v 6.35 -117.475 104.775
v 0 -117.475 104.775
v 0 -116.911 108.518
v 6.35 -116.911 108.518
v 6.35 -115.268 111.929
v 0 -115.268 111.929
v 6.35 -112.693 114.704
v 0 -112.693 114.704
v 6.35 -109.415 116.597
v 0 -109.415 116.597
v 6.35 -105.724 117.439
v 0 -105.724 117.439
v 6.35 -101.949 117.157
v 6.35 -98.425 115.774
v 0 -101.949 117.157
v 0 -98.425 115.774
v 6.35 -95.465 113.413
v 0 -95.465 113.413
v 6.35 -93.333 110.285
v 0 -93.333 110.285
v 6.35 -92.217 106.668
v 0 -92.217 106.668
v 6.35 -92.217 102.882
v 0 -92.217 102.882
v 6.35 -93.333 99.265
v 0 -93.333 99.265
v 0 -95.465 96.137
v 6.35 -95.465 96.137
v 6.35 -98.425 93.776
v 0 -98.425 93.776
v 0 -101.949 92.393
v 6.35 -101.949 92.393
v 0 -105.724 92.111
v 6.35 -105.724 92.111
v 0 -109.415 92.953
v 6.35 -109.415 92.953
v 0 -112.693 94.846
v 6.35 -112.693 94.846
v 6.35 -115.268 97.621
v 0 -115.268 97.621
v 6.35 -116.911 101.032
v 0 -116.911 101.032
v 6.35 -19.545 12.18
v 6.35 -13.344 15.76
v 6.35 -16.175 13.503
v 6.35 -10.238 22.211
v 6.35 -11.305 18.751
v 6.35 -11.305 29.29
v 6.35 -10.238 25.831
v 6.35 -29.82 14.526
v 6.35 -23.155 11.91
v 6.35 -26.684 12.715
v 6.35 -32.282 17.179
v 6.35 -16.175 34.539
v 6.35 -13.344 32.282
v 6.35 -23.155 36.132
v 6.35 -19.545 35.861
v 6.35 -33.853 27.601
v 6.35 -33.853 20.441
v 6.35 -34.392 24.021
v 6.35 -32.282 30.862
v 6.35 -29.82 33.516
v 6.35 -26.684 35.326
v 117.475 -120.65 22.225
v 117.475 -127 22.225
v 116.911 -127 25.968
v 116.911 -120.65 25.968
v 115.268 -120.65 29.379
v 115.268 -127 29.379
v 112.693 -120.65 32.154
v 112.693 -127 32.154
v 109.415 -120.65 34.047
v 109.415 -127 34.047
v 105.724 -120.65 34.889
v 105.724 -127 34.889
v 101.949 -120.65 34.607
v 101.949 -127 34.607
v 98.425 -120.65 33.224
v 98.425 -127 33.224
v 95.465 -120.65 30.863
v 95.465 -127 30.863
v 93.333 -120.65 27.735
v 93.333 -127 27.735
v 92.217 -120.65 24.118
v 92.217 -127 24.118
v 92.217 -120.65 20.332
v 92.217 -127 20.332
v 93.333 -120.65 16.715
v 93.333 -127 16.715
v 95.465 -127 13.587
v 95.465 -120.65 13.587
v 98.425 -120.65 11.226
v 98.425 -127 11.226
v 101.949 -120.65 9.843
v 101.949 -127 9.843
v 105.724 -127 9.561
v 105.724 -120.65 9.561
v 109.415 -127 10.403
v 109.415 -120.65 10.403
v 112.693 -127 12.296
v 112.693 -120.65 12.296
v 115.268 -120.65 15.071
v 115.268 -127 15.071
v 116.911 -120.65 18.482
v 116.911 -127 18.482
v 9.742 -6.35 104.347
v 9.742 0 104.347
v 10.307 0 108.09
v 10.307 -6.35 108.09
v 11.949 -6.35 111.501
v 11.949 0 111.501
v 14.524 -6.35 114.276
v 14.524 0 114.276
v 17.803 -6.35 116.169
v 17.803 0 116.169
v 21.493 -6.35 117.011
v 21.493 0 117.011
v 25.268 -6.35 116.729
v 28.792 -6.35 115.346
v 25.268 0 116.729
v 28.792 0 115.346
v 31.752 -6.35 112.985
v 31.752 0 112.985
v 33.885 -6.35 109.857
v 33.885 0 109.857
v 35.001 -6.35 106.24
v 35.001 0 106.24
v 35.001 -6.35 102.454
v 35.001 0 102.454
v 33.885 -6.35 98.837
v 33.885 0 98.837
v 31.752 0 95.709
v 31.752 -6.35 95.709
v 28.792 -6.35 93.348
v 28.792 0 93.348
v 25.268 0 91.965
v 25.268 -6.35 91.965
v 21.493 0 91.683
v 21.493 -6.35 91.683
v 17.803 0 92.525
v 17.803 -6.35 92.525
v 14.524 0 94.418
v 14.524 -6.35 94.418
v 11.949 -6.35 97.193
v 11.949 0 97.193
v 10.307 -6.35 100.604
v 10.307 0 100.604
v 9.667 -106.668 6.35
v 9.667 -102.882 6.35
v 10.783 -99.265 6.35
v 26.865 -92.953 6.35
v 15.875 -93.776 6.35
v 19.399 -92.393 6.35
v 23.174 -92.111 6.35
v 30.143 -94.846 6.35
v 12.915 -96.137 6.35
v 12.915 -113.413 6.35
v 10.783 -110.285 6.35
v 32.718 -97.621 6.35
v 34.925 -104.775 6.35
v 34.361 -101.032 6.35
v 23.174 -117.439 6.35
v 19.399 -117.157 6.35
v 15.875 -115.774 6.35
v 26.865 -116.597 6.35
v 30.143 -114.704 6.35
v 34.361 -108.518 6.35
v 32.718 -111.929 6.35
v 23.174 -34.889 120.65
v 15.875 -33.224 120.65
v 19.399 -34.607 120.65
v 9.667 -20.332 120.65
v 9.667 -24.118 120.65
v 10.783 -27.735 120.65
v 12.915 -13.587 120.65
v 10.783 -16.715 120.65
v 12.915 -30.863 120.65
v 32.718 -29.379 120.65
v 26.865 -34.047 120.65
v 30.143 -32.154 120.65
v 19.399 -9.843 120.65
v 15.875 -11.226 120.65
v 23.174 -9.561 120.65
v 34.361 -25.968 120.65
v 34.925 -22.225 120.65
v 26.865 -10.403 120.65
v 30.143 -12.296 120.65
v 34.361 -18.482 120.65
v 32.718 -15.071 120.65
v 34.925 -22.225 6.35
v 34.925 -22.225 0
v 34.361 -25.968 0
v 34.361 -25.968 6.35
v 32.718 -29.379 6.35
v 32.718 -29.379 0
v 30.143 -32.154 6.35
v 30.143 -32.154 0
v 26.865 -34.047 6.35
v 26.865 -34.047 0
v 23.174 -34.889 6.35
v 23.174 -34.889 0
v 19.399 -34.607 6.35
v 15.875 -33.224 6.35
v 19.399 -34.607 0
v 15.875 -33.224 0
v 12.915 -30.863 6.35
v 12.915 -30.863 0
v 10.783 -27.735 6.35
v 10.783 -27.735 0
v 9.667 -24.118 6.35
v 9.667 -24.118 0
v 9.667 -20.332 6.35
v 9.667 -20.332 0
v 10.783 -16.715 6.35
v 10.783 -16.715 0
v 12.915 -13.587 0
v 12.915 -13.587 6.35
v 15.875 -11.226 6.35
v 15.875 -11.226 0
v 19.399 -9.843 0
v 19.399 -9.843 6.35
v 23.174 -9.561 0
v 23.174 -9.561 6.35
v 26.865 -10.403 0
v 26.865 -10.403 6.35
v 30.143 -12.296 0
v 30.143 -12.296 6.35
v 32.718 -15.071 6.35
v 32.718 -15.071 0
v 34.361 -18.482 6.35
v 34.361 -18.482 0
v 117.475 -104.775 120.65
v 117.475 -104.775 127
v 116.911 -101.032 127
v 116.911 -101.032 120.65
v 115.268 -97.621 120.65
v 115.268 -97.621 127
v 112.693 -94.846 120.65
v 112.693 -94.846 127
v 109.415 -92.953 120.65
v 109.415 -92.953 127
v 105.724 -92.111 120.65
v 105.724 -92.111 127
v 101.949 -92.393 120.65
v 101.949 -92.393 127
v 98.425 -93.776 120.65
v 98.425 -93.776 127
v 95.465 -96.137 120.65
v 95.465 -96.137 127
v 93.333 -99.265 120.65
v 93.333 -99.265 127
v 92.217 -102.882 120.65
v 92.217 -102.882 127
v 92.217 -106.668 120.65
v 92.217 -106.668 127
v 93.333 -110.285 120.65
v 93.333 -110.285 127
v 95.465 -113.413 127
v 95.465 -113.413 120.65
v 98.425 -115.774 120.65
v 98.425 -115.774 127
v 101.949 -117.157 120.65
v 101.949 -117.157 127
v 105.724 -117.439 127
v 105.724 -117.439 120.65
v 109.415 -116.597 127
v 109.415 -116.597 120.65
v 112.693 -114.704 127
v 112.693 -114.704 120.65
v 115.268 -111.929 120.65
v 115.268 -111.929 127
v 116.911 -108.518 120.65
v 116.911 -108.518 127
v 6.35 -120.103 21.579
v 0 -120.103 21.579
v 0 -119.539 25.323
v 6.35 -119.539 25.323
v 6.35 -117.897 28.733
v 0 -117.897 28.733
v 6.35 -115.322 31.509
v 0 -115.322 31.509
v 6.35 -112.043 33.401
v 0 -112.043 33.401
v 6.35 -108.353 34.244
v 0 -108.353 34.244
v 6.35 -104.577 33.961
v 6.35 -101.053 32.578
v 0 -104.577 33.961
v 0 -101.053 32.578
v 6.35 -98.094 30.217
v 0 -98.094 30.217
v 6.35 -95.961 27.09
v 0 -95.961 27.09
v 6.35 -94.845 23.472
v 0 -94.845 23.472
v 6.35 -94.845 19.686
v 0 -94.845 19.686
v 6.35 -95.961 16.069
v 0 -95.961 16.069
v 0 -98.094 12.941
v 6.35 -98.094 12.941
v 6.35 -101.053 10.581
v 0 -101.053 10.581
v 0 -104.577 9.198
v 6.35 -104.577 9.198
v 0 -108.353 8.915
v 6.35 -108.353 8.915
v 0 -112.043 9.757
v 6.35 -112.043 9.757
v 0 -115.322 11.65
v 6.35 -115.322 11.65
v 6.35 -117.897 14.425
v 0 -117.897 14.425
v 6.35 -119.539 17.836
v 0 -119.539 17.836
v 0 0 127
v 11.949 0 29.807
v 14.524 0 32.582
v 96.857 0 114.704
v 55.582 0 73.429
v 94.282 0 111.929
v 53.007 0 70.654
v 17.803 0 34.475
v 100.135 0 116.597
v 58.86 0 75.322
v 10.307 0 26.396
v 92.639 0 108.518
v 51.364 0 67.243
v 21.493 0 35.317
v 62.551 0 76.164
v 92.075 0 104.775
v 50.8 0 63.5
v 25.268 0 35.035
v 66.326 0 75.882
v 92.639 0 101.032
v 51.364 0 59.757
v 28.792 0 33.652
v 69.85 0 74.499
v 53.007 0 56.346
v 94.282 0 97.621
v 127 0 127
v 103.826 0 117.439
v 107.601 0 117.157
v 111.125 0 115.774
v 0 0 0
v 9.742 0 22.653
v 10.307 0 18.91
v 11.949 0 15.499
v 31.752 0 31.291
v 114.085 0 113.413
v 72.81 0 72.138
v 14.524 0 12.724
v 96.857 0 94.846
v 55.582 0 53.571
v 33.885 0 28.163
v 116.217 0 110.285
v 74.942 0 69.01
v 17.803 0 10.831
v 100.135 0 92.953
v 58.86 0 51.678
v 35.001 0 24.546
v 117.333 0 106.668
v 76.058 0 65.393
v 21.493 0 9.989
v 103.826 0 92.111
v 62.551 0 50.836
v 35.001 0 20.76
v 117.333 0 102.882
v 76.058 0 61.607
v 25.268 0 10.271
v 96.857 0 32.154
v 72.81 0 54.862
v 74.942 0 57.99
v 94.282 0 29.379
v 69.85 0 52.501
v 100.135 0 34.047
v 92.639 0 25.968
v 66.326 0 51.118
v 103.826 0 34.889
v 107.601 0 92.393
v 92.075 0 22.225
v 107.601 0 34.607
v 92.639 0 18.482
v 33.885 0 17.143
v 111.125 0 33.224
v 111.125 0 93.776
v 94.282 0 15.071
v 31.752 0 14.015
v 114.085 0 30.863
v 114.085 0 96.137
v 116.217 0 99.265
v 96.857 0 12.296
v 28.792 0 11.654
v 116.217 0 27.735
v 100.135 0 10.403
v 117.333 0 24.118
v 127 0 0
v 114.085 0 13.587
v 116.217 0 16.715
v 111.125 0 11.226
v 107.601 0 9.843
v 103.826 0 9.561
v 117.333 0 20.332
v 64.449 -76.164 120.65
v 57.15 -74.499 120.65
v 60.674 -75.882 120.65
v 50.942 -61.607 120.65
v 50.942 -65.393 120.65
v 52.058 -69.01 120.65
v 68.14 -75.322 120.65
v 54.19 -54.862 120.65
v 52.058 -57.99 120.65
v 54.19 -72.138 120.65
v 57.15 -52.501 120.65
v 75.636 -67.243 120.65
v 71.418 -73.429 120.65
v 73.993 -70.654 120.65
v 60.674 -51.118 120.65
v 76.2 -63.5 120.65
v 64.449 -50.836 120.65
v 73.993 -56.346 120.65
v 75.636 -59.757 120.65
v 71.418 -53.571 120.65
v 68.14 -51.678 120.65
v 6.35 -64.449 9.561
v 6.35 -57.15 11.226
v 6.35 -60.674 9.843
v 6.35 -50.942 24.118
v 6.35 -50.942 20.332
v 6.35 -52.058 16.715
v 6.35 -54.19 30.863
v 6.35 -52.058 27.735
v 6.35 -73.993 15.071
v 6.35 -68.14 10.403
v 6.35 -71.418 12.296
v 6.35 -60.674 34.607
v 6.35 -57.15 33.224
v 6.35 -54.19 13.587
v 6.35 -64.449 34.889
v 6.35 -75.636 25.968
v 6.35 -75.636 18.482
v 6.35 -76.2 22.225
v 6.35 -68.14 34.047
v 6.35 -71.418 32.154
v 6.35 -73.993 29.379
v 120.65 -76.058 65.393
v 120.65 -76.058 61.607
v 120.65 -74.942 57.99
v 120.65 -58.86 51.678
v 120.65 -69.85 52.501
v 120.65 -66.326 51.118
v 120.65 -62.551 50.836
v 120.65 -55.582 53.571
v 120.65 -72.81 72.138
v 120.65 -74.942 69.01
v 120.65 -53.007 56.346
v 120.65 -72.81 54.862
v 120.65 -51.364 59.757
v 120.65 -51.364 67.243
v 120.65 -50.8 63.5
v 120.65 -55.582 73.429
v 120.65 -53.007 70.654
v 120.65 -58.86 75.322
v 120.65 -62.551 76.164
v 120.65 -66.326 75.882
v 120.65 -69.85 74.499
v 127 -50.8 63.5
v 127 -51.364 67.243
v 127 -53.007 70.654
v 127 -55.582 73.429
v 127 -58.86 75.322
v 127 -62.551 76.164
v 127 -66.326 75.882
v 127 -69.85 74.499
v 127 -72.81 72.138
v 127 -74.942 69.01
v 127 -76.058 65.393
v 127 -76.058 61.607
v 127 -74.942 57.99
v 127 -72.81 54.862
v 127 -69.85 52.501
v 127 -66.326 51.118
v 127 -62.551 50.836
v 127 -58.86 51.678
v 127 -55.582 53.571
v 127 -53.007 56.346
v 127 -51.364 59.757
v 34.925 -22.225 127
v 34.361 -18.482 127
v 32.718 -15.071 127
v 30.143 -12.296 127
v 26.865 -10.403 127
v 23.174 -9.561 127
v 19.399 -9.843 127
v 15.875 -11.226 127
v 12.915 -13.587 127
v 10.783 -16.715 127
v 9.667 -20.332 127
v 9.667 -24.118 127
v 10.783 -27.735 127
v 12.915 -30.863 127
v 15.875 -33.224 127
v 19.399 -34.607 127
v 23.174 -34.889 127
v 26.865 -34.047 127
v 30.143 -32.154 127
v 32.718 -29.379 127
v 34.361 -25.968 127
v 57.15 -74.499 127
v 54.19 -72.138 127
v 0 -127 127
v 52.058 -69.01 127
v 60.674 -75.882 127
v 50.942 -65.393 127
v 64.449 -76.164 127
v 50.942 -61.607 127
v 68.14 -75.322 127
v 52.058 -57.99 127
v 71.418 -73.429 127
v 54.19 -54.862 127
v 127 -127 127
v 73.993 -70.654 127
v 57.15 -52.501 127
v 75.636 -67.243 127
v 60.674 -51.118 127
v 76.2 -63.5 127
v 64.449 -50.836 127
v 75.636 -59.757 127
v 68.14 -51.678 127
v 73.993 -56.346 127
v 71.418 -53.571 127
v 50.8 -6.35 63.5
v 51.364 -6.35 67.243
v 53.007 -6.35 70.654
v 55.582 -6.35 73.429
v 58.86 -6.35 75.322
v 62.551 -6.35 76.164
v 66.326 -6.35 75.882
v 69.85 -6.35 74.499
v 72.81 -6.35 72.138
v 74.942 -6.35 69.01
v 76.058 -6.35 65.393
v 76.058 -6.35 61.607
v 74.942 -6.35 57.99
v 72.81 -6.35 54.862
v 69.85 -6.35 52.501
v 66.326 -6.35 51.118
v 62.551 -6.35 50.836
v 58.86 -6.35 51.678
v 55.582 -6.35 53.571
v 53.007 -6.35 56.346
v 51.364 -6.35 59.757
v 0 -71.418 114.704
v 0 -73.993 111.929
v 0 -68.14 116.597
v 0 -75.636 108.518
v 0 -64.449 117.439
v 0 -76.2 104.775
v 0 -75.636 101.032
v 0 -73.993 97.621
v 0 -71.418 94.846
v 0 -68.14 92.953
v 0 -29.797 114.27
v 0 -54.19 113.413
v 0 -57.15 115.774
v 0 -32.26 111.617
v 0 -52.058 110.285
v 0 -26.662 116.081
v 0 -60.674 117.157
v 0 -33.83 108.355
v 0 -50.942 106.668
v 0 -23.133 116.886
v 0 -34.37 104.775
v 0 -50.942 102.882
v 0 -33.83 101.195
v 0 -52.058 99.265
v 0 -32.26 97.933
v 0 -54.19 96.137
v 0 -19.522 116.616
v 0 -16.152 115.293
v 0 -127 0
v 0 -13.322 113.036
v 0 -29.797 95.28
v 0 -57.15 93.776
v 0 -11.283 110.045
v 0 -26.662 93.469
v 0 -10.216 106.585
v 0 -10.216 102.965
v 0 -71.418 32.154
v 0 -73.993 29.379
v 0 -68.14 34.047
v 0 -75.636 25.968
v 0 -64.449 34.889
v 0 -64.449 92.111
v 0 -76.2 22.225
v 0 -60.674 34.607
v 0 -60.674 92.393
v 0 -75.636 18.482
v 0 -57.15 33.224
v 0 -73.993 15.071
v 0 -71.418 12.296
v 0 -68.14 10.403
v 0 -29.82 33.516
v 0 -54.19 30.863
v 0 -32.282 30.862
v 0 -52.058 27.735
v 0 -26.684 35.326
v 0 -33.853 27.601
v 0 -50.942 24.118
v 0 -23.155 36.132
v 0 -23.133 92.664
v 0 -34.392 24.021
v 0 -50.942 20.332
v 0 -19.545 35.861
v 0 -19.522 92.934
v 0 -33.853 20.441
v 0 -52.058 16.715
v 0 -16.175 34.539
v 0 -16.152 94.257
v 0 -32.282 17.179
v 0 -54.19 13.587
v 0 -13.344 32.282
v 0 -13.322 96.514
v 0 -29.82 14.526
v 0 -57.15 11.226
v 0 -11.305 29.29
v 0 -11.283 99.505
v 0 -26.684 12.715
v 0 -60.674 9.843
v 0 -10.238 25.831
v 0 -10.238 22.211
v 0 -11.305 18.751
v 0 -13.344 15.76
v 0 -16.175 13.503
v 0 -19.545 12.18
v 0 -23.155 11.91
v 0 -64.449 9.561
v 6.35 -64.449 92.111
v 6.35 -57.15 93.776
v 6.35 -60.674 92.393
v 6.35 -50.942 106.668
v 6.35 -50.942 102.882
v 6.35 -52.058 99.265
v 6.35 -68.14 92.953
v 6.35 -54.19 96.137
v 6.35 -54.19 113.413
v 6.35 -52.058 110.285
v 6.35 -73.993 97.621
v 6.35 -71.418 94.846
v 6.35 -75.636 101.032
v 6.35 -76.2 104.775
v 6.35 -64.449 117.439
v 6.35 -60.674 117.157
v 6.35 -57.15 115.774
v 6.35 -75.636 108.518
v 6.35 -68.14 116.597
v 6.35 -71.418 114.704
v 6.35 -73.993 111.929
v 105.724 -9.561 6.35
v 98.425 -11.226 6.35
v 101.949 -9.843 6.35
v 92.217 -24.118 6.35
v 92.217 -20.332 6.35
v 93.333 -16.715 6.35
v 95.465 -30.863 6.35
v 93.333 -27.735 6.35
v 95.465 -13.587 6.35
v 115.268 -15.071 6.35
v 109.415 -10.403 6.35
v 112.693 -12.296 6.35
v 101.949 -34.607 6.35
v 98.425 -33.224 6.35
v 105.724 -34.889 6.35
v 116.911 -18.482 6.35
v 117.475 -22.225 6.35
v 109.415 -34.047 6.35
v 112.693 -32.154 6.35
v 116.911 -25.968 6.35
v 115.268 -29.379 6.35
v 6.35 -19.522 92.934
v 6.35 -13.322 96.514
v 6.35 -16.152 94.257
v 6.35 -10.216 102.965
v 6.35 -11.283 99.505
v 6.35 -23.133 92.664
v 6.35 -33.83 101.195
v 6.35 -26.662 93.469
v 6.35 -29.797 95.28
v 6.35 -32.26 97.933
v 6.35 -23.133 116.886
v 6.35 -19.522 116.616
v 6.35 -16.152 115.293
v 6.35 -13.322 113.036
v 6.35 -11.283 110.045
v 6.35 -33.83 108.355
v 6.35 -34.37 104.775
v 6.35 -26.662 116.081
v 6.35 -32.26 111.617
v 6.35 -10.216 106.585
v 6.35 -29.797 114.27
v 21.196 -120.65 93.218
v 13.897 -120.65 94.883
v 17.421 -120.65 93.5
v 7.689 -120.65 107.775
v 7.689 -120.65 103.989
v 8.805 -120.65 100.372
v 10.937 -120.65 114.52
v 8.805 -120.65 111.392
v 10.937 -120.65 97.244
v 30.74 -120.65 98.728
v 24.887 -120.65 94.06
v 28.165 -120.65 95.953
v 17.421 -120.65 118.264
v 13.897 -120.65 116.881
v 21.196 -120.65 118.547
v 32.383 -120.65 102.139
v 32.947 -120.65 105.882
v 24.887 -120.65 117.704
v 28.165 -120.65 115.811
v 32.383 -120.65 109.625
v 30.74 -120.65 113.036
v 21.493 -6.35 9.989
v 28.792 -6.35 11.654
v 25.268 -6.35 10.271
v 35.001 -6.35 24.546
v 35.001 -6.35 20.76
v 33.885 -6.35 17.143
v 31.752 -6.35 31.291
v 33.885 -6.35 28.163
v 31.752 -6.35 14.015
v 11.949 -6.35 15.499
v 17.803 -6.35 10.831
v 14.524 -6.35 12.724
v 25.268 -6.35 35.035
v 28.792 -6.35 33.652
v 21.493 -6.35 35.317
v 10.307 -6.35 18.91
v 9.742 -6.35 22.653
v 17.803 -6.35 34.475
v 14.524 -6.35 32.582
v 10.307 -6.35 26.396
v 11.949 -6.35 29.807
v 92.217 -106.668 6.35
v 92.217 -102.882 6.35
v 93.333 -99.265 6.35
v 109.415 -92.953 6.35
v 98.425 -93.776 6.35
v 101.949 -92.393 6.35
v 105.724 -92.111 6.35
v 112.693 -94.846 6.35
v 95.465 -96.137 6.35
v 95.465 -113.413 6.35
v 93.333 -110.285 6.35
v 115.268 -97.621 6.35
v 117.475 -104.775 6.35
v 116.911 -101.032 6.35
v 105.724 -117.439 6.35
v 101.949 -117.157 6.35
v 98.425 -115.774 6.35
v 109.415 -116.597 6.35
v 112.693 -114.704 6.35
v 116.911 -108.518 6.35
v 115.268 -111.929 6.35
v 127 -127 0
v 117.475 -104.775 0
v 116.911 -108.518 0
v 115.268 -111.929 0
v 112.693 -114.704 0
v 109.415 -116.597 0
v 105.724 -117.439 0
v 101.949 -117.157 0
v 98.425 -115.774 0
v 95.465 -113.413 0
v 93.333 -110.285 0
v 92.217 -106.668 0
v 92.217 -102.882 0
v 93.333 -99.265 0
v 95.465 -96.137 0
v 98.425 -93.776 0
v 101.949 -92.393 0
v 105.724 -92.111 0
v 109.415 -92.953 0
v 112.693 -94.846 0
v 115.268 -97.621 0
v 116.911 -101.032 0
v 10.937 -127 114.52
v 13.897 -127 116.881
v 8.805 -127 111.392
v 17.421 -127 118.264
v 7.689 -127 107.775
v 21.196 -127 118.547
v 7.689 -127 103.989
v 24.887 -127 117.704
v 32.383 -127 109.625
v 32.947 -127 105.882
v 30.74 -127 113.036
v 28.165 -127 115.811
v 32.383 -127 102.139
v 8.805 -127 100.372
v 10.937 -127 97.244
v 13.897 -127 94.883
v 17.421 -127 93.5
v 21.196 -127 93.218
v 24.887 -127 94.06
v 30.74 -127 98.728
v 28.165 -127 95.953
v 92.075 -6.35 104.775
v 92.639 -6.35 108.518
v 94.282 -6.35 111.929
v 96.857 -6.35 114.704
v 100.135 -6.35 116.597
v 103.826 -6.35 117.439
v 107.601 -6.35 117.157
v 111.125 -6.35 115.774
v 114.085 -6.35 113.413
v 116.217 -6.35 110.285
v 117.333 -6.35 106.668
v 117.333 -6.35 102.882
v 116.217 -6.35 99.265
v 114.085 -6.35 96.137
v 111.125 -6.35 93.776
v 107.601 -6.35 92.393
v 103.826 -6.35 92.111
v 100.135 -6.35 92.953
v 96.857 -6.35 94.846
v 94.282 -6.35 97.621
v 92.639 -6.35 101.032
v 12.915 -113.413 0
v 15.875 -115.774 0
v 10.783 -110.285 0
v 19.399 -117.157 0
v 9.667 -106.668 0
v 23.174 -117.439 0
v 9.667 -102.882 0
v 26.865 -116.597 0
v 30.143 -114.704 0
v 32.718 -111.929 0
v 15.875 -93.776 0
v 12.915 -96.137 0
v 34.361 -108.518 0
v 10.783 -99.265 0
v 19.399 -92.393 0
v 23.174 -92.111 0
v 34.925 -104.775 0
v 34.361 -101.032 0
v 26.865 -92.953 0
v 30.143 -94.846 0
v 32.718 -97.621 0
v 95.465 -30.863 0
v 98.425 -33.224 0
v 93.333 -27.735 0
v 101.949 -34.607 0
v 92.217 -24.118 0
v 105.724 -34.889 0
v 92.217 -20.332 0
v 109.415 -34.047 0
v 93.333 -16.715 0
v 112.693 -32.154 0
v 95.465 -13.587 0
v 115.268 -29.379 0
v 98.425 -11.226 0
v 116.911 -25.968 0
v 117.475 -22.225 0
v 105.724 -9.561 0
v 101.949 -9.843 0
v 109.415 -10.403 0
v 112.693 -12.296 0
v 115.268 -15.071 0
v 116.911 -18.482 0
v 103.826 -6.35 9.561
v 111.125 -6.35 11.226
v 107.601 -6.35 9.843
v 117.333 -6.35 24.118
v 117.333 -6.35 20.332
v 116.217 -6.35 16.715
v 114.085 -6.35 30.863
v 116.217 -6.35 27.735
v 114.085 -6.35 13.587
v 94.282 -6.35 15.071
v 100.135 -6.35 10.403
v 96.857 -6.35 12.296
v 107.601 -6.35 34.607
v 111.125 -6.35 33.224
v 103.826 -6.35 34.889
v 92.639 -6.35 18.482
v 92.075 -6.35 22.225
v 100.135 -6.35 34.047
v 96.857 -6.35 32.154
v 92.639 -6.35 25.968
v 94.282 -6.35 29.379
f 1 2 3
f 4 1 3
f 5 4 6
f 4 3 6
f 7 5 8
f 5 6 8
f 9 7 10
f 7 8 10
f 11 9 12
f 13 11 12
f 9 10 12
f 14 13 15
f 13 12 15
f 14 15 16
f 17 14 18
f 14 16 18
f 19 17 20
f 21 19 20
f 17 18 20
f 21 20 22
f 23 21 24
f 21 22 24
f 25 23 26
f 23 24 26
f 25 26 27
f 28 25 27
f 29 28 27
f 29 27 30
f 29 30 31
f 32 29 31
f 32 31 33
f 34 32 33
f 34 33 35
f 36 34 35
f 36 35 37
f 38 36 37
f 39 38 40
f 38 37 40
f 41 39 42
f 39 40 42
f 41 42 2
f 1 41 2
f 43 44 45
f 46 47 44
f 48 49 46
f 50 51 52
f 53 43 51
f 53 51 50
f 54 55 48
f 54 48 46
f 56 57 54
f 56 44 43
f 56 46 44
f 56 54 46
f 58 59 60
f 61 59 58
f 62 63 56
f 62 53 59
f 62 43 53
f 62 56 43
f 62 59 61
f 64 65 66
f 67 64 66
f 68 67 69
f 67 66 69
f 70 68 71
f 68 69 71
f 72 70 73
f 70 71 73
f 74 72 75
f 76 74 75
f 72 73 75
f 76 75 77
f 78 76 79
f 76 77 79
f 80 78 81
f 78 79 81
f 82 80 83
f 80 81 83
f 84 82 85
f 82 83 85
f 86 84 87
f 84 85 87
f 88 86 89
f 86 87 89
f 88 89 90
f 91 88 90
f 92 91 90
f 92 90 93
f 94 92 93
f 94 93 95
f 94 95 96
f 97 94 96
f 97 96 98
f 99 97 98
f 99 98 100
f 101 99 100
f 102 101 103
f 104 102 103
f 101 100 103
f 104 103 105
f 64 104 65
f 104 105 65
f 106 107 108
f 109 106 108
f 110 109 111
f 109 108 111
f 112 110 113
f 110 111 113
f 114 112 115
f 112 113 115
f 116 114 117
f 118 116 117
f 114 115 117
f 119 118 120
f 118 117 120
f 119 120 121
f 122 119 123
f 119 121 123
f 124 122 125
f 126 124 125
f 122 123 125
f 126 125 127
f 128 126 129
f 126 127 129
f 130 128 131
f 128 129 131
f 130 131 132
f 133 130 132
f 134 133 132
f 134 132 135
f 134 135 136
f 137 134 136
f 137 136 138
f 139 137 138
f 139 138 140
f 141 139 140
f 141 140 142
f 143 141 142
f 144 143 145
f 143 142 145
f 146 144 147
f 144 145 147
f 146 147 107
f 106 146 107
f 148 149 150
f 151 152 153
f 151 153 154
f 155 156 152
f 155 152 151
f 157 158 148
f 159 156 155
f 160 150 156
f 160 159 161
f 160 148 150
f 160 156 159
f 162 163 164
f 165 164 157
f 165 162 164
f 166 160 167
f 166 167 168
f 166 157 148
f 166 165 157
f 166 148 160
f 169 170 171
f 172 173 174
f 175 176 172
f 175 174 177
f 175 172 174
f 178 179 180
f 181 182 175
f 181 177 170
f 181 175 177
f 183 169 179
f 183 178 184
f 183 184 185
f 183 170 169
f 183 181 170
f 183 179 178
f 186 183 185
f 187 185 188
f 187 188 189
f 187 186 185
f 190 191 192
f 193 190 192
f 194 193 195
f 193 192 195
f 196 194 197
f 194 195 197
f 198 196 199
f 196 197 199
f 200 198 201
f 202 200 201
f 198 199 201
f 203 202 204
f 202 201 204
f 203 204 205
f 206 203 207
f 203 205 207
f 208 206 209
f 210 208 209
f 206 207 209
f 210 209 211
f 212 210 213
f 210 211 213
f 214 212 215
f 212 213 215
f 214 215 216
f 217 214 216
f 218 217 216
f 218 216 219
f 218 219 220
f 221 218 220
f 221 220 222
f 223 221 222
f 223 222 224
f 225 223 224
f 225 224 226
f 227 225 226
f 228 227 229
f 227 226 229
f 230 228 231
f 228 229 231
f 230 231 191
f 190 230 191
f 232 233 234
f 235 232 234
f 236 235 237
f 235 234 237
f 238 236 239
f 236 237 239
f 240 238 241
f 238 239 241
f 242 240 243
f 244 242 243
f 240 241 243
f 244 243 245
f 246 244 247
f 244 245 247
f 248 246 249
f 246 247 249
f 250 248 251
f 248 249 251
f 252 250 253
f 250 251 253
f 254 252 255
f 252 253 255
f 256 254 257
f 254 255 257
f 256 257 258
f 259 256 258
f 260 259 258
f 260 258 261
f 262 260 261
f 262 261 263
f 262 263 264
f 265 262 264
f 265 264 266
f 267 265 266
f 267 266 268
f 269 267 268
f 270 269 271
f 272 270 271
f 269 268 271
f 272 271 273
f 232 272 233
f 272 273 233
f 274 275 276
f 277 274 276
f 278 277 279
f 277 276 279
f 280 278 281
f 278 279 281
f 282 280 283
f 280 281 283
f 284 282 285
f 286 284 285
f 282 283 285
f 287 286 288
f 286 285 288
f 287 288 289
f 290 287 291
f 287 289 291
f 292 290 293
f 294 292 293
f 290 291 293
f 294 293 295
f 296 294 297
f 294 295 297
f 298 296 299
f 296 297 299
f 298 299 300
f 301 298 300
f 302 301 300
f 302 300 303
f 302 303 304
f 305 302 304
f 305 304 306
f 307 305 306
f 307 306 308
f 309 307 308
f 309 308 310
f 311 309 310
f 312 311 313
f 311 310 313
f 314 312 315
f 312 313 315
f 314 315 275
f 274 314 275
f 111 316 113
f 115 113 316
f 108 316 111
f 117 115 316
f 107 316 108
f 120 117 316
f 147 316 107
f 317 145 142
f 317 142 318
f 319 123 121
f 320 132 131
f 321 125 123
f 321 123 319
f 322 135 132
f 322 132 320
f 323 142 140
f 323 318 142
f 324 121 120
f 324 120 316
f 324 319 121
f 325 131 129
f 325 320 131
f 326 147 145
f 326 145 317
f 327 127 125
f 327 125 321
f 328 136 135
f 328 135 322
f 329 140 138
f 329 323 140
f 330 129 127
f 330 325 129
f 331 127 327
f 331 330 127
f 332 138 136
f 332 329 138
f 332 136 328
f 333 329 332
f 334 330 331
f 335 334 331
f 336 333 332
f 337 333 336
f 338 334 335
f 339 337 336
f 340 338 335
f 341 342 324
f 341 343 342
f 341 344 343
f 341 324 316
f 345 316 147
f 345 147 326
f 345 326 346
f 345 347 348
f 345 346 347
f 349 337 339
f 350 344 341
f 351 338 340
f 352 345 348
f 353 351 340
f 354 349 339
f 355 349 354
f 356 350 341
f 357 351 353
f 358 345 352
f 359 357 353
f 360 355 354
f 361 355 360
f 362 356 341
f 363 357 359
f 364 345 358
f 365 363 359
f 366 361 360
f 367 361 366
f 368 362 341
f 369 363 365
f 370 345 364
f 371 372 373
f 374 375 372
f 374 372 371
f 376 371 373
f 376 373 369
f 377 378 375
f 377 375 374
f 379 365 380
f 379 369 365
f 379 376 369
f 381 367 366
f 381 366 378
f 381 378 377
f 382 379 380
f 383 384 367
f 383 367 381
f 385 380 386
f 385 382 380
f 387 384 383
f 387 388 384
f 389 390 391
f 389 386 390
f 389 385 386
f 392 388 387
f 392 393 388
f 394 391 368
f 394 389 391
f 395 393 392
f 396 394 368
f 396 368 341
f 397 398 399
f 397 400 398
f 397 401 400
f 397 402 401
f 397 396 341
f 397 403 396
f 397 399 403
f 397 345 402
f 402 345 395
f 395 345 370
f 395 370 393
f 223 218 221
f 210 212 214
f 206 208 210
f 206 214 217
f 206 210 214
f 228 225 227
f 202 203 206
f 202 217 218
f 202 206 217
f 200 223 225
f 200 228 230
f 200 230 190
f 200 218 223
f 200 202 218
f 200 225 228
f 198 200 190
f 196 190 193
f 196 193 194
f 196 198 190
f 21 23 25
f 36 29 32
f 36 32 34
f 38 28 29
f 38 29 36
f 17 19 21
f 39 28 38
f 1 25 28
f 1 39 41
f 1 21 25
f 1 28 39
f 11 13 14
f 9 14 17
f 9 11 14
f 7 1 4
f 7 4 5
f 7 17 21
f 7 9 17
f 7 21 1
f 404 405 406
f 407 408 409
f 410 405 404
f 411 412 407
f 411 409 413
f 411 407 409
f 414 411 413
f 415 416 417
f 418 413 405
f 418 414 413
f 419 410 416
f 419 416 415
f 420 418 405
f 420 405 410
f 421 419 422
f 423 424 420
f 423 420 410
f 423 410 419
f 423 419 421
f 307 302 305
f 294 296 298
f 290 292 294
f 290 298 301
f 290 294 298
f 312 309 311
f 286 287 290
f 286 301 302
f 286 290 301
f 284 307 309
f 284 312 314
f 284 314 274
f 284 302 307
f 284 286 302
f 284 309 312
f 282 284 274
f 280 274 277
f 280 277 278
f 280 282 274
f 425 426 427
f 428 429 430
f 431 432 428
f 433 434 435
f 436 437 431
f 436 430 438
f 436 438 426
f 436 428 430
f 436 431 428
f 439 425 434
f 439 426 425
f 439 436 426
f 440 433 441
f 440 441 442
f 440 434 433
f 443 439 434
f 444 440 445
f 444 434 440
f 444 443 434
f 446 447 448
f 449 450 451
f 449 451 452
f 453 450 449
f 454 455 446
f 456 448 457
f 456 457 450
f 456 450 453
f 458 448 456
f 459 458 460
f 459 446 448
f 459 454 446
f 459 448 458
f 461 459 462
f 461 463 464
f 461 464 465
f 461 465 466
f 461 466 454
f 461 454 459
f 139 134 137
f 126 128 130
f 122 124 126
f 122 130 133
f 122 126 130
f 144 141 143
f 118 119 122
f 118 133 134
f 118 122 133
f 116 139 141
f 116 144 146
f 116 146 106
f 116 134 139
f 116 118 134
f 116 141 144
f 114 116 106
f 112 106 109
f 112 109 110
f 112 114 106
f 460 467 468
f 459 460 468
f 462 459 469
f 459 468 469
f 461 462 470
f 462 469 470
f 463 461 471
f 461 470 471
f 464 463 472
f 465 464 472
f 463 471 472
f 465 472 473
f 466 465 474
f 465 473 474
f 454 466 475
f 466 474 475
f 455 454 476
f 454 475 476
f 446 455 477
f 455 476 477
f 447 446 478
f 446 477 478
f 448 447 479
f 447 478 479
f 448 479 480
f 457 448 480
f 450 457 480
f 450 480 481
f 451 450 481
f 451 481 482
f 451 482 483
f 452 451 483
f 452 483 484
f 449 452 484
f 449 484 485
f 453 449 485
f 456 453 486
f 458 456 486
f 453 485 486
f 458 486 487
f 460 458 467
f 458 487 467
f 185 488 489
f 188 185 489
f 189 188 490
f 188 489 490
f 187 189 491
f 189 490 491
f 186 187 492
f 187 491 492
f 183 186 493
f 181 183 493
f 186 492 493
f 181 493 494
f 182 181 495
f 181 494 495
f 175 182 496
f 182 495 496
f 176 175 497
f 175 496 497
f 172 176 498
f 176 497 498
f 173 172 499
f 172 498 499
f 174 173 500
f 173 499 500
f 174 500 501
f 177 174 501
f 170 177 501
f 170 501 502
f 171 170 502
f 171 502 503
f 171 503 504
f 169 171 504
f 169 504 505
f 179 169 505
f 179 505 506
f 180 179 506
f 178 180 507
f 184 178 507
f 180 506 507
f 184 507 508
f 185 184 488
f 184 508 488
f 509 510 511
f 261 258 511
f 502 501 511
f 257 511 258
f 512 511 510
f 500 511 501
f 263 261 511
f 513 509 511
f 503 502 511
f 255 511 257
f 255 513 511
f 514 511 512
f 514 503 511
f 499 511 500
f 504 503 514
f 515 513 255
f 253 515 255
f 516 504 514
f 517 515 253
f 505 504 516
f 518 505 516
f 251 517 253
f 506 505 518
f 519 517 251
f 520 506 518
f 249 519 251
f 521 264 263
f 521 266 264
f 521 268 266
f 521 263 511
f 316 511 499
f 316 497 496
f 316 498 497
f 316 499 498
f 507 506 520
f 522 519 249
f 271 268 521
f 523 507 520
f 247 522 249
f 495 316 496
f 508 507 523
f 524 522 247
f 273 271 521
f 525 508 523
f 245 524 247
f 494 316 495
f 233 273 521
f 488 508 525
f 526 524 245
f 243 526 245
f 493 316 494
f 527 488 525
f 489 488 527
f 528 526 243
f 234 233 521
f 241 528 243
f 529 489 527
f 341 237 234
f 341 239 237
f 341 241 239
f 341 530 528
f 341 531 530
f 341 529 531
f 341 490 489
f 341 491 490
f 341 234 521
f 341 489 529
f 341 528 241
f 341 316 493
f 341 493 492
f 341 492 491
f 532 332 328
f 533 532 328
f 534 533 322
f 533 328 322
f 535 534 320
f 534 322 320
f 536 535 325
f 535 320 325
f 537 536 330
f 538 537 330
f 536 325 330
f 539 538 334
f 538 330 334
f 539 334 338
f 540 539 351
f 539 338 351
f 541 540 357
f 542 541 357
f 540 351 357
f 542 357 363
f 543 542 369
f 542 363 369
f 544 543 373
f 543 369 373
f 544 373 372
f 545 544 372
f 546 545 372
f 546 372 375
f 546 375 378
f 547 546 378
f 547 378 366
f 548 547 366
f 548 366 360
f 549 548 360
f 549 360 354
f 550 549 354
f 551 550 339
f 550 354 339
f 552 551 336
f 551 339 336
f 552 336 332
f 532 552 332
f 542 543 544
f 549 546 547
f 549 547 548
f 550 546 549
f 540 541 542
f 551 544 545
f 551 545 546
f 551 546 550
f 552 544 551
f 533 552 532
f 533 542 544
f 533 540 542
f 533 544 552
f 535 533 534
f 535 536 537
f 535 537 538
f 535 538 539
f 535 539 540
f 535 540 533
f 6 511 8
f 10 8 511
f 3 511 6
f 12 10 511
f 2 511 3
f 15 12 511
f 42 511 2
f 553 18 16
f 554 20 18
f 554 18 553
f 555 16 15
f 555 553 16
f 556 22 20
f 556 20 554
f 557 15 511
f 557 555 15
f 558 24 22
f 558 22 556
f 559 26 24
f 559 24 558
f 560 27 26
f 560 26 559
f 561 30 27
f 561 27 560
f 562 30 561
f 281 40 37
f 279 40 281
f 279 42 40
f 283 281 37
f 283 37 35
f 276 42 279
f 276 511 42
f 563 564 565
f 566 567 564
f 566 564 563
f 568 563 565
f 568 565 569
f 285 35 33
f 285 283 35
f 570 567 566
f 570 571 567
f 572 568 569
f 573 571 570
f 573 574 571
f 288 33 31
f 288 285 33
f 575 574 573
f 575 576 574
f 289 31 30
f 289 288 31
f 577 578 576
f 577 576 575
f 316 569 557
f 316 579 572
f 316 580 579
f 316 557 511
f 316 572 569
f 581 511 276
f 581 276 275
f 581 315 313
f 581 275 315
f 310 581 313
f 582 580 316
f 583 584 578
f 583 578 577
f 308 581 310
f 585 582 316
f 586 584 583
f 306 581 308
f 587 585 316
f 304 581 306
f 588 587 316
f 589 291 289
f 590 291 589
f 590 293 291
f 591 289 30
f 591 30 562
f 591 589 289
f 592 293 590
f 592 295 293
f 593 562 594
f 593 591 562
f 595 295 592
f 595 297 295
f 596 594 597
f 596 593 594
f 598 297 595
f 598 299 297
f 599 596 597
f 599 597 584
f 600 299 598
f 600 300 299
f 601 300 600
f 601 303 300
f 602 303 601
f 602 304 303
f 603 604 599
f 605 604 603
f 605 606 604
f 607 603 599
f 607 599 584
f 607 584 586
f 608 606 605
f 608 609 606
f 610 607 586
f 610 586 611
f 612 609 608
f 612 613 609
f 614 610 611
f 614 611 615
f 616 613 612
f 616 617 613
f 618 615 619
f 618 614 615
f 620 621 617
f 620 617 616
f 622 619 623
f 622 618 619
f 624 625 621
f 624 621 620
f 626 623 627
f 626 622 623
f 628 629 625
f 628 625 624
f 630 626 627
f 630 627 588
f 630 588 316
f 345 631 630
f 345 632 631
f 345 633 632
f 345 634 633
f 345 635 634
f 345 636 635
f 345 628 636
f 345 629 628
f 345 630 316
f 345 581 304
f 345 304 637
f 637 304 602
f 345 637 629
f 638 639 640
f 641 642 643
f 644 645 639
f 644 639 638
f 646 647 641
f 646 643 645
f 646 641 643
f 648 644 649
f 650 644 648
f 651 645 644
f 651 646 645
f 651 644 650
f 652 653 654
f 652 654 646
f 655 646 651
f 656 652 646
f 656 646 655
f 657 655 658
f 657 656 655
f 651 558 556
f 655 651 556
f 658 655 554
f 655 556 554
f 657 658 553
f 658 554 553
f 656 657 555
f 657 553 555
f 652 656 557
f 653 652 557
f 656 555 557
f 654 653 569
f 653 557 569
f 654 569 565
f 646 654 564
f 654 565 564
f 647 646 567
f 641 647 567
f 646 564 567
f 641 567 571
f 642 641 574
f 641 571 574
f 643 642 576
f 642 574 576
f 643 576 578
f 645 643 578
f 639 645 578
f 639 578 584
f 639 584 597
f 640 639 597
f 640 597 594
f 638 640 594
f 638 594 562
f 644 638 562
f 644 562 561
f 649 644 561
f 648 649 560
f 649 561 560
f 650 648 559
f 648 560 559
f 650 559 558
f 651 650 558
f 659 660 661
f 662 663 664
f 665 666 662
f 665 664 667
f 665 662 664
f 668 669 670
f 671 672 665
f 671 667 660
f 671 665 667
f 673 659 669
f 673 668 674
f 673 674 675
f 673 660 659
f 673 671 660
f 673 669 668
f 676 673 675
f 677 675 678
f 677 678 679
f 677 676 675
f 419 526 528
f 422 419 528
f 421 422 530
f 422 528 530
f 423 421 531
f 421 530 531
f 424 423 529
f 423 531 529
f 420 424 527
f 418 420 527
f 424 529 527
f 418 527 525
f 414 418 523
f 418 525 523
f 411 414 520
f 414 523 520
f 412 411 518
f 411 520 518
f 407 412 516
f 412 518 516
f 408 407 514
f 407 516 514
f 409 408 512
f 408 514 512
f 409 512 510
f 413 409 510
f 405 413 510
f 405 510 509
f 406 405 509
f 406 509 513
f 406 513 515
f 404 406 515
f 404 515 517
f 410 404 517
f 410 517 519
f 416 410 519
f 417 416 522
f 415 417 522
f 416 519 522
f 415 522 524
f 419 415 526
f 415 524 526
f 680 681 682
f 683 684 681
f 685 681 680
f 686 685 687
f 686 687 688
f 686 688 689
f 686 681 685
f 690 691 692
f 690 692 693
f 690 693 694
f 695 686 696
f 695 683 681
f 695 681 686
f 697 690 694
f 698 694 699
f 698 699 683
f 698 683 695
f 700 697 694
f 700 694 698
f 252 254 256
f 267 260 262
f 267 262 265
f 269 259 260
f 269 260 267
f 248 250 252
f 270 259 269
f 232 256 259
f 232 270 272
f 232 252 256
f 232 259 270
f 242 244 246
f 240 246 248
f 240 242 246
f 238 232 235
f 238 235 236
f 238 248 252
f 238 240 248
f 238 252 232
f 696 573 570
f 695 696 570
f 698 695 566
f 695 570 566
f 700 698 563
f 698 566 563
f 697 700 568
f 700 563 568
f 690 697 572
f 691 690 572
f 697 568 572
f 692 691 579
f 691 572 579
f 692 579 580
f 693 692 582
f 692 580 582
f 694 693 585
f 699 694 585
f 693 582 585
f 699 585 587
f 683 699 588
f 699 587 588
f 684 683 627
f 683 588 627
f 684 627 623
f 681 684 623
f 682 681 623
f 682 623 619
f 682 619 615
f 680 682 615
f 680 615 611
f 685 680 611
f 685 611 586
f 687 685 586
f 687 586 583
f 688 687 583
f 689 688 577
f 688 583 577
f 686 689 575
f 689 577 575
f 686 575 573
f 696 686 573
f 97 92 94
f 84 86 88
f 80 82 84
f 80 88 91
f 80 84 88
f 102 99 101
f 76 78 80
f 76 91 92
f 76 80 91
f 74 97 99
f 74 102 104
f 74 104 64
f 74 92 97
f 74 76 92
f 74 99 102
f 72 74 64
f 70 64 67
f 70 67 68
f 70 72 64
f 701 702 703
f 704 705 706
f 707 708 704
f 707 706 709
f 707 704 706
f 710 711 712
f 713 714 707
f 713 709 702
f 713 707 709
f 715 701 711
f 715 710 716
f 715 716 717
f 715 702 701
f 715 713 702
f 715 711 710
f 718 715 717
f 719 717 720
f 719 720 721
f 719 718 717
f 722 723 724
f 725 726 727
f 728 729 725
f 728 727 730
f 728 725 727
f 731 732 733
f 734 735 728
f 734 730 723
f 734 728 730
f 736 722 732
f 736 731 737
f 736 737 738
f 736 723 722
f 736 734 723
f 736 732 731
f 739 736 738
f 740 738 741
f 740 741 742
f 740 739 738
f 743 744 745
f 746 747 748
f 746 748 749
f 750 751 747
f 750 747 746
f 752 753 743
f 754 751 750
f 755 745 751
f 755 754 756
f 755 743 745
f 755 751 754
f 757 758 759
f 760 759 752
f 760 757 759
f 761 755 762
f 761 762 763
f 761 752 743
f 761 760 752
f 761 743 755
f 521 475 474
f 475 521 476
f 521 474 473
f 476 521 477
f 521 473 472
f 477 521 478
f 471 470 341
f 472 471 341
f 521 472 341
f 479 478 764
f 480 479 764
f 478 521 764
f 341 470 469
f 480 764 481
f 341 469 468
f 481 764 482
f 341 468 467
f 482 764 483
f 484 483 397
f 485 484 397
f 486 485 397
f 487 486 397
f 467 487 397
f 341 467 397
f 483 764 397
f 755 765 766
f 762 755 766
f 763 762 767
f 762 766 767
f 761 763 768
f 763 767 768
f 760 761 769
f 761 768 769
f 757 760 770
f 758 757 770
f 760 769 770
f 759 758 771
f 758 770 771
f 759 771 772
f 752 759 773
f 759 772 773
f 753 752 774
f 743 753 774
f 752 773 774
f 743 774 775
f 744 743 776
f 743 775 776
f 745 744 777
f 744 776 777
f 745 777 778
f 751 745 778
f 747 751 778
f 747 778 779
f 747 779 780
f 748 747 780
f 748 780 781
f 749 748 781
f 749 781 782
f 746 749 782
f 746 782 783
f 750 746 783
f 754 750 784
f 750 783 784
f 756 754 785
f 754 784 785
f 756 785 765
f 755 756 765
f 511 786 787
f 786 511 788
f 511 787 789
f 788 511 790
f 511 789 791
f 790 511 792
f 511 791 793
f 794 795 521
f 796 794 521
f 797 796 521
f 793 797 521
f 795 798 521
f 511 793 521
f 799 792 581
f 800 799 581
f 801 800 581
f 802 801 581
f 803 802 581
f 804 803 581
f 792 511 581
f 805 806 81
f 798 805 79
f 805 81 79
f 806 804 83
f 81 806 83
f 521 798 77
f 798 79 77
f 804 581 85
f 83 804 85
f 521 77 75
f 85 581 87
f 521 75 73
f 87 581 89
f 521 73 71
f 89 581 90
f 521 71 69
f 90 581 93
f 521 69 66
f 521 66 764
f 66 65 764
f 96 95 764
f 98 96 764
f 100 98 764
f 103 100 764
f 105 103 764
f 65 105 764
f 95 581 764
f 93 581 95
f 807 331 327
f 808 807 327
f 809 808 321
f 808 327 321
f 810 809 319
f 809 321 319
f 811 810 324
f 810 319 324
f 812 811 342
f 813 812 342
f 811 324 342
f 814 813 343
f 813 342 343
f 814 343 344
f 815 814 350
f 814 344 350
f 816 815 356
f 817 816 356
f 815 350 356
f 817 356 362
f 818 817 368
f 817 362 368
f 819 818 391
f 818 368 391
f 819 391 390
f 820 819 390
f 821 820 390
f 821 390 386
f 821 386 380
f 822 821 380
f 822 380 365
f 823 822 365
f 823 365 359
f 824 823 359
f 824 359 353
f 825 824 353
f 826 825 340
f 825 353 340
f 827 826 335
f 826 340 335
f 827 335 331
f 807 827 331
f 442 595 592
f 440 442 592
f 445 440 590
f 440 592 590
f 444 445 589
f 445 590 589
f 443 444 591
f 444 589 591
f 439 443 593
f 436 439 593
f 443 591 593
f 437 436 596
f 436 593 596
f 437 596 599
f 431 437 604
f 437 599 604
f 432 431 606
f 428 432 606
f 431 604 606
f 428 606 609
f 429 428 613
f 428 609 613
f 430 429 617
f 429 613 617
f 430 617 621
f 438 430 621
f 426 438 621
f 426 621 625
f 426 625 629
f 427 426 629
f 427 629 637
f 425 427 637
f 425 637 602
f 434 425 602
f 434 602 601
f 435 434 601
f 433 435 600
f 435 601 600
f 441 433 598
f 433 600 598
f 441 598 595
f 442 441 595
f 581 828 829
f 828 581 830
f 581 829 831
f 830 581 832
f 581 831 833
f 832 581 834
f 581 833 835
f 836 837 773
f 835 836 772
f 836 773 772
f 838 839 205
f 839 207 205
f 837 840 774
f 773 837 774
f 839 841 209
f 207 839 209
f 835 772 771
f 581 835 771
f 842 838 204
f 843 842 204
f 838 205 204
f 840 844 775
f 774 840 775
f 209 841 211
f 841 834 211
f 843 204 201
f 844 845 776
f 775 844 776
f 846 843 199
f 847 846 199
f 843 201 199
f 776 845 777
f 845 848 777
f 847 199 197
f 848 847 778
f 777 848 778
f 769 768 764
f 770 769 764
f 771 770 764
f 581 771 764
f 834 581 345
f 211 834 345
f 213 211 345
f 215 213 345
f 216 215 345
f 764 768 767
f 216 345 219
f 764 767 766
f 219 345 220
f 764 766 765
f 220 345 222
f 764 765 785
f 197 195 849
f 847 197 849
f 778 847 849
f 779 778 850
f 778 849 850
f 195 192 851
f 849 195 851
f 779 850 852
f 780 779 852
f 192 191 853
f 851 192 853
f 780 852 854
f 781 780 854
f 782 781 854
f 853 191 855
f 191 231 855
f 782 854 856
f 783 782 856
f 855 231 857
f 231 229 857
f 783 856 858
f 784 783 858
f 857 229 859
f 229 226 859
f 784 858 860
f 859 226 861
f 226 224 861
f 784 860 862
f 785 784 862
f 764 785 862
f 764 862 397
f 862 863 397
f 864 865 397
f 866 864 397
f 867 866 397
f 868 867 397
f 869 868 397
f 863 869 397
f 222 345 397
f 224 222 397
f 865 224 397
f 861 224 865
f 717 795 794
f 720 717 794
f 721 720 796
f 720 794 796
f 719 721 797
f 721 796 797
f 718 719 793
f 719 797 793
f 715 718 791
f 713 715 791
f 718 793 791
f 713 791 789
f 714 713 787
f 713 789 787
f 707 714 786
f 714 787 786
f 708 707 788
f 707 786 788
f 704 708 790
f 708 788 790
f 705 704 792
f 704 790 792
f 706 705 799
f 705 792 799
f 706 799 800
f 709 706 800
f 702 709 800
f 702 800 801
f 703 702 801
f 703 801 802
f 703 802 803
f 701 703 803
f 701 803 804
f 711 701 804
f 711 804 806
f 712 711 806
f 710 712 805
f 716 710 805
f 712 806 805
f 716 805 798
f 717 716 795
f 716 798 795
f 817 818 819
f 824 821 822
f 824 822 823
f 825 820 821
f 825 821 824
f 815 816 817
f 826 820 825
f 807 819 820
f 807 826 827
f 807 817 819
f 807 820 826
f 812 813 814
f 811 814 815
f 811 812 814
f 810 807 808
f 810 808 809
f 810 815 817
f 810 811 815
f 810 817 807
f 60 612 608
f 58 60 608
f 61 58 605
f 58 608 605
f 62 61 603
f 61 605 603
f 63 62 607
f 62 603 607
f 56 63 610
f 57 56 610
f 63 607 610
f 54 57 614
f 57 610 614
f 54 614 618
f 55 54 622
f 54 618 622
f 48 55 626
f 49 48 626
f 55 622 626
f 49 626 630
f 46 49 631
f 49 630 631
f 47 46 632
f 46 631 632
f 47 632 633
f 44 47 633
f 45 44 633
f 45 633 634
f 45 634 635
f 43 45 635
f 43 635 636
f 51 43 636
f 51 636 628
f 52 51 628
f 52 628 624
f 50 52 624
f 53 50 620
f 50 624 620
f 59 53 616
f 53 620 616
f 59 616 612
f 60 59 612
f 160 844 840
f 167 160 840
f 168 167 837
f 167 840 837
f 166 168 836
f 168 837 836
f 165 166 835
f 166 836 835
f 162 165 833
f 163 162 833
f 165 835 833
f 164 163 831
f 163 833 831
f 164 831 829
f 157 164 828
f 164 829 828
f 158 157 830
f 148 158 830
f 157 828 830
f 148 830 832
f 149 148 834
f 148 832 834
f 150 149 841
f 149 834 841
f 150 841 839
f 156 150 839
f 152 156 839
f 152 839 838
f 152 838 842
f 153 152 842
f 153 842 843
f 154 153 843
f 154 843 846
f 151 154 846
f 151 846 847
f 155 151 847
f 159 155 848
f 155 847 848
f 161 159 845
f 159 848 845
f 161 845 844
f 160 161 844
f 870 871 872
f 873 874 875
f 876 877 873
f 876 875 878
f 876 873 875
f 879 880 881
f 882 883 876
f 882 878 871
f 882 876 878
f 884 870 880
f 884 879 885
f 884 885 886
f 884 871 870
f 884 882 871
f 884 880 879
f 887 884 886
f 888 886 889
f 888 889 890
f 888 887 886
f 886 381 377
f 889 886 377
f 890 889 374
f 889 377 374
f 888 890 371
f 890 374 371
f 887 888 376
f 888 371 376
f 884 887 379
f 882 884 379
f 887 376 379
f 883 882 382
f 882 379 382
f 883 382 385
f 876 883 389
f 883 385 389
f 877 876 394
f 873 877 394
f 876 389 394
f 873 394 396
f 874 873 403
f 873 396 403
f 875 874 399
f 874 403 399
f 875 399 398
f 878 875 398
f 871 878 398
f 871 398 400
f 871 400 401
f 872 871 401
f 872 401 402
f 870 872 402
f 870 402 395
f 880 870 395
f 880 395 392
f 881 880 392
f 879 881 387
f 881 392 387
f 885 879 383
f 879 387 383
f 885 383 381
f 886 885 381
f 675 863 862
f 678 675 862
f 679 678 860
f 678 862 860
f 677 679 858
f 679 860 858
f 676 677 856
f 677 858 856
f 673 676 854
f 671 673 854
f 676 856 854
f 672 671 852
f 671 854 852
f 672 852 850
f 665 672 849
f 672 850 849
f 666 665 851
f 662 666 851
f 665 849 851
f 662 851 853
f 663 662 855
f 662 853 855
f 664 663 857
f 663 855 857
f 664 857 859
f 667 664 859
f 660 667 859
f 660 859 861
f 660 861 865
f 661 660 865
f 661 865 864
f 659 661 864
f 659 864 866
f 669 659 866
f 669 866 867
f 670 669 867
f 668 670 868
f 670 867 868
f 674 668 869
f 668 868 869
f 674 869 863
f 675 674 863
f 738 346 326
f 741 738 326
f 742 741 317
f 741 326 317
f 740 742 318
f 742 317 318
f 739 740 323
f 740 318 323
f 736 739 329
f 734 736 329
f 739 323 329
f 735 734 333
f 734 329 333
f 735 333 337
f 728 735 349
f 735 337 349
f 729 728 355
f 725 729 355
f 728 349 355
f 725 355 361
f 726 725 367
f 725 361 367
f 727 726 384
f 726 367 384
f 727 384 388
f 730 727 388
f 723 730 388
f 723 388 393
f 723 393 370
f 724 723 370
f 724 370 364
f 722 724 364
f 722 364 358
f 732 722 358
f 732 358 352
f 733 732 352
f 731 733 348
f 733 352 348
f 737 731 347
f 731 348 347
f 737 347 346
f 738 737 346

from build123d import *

# Parameters (mm, degrees)
F0_W      = 127
F0_H      = 127
F1_DEPTH  = 127
F2_R      = 12.7
F3_DEPTH  = 6.35
F4_R      = 12.7
F5_DEPTH  = 6.35
F6_R      = 12.7
F7_R      = 12.7
F7_R_2    = 12.14507
F8_DEPTH  = 6.35
F9_R      = 12.7
F10_DEPTH = 6.35
F11_R     = 12.7
F12_DEPTH = 6.35
F13_R     = 12.7
F14_DEPTH = 6.35


with BuildPart() as f1:
    # F0 (on Top) → F1 (new body)
    with BuildSketch(Plane.XY):
        with Locations((63.5, -63.5)):
            Rectangle(F0_W, F0_H)
    extrude(amount=F1_DEPTH)

    # F2 (on face) → F3 (cut)
    with BuildSketch(Plane.YZ.offset(127)):
        with Locations((-63.5, 63.5)):
            Circle(F2_R)
    extrude(amount=-F3_DEPTH, mode=Mode.SUBTRACT)

    # F4 (on face) → F5 (cut)
    with BuildSketch(Plane.XZ.offset(127)):
        with Locations((20.24712, 105.882019)):
            Circle(F4_R)
        with Locations((104.775, 22.225)):
            Circle(F4_R)
    extrude(amount=-F5_DEPTH, mode=Mode.SUBTRACT)

    # F6 (on face) + F7 (on face) → F8 (cut)
    with BuildSketch(Plane(origin=(0, 0, 0), x_dir=(0, -1, 0), z_dir=(-1, 0, 0))):
        with Locations((107.403494, 21.579256)):
            Circle(F6_R)
    with BuildSketch(Plane(origin=(0, 0, 0), x_dir=(0, -1, 0), z_dir=(-1, 0, 0))):
        with Locations((63.5, 22.225)):
            Circle(F7_R)
        with Locations((22.247186, 24.020914)):
            Circle(F7_R_2)
        with Locations((104.775, 104.775)):
            Circle(F7_R)
        with Locations((63.5, 104.775)):
            Circle(F7_R)
        with Locations((22.225, 104.775)):
            Circle(F7_R_2)
    extrude(amount=-F8_DEPTH, mode=Mode.SUBTRACT)

    # F9 (on face) → F10 (cut)
    with BuildSketch(Plane(origin=(0, 0, 0), x_dir=(-1, 0, 0), z_dir=(0, 1, 0))):
        with Locations((-22.44245, 104.347)):
            Circle(F9_R)
        with Locations((-63.5, 63.5)):
            Circle(F9_R)
        with Locations((-22.44245, 22.653)):
            Circle(F9_R)
        with Locations((-104.775, 22.225)):
            Circle(F9_R)
        with Locations((-104.775, 104.775)):
            Circle(F9_R)
    extrude(amount=-F10_DEPTH, mode=Mode.SUBTRACT)

    # F11 (on face) → F12 (cut)
    with BuildSketch(Plane(origin=(0, 0, 0), x_dir=(1, 0, 0), z_dir=(0, 0, -1))):
        with Locations((104.775, 104.775)):
            Circle(F11_R)
        with Locations((22.225, 104.775)):
            Circle(F11_R)
        with Locations((104.775, 22.225)):
            Circle(F11_R)
        with Locations((22.225, 22.225)):
            Circle(F11_R)
    extrude(amount=-F12_DEPTH, mode=Mode.SUBTRACT)

    # F13 (on face) → F14 (cut)
    with BuildSketch(Plane.XY.offset(127)):
        with Locations((63.5, -63.5)):
            Circle(F13_R)
        with Locations((104.775, -104.775)):
            Circle(F13_R)
        with Locations((22.225, -22.225)):
            Circle(F13_R)
    extrude(amount=-F14_DEPTH, mode=Mode.SUBTRACT)


solid = f1.part
